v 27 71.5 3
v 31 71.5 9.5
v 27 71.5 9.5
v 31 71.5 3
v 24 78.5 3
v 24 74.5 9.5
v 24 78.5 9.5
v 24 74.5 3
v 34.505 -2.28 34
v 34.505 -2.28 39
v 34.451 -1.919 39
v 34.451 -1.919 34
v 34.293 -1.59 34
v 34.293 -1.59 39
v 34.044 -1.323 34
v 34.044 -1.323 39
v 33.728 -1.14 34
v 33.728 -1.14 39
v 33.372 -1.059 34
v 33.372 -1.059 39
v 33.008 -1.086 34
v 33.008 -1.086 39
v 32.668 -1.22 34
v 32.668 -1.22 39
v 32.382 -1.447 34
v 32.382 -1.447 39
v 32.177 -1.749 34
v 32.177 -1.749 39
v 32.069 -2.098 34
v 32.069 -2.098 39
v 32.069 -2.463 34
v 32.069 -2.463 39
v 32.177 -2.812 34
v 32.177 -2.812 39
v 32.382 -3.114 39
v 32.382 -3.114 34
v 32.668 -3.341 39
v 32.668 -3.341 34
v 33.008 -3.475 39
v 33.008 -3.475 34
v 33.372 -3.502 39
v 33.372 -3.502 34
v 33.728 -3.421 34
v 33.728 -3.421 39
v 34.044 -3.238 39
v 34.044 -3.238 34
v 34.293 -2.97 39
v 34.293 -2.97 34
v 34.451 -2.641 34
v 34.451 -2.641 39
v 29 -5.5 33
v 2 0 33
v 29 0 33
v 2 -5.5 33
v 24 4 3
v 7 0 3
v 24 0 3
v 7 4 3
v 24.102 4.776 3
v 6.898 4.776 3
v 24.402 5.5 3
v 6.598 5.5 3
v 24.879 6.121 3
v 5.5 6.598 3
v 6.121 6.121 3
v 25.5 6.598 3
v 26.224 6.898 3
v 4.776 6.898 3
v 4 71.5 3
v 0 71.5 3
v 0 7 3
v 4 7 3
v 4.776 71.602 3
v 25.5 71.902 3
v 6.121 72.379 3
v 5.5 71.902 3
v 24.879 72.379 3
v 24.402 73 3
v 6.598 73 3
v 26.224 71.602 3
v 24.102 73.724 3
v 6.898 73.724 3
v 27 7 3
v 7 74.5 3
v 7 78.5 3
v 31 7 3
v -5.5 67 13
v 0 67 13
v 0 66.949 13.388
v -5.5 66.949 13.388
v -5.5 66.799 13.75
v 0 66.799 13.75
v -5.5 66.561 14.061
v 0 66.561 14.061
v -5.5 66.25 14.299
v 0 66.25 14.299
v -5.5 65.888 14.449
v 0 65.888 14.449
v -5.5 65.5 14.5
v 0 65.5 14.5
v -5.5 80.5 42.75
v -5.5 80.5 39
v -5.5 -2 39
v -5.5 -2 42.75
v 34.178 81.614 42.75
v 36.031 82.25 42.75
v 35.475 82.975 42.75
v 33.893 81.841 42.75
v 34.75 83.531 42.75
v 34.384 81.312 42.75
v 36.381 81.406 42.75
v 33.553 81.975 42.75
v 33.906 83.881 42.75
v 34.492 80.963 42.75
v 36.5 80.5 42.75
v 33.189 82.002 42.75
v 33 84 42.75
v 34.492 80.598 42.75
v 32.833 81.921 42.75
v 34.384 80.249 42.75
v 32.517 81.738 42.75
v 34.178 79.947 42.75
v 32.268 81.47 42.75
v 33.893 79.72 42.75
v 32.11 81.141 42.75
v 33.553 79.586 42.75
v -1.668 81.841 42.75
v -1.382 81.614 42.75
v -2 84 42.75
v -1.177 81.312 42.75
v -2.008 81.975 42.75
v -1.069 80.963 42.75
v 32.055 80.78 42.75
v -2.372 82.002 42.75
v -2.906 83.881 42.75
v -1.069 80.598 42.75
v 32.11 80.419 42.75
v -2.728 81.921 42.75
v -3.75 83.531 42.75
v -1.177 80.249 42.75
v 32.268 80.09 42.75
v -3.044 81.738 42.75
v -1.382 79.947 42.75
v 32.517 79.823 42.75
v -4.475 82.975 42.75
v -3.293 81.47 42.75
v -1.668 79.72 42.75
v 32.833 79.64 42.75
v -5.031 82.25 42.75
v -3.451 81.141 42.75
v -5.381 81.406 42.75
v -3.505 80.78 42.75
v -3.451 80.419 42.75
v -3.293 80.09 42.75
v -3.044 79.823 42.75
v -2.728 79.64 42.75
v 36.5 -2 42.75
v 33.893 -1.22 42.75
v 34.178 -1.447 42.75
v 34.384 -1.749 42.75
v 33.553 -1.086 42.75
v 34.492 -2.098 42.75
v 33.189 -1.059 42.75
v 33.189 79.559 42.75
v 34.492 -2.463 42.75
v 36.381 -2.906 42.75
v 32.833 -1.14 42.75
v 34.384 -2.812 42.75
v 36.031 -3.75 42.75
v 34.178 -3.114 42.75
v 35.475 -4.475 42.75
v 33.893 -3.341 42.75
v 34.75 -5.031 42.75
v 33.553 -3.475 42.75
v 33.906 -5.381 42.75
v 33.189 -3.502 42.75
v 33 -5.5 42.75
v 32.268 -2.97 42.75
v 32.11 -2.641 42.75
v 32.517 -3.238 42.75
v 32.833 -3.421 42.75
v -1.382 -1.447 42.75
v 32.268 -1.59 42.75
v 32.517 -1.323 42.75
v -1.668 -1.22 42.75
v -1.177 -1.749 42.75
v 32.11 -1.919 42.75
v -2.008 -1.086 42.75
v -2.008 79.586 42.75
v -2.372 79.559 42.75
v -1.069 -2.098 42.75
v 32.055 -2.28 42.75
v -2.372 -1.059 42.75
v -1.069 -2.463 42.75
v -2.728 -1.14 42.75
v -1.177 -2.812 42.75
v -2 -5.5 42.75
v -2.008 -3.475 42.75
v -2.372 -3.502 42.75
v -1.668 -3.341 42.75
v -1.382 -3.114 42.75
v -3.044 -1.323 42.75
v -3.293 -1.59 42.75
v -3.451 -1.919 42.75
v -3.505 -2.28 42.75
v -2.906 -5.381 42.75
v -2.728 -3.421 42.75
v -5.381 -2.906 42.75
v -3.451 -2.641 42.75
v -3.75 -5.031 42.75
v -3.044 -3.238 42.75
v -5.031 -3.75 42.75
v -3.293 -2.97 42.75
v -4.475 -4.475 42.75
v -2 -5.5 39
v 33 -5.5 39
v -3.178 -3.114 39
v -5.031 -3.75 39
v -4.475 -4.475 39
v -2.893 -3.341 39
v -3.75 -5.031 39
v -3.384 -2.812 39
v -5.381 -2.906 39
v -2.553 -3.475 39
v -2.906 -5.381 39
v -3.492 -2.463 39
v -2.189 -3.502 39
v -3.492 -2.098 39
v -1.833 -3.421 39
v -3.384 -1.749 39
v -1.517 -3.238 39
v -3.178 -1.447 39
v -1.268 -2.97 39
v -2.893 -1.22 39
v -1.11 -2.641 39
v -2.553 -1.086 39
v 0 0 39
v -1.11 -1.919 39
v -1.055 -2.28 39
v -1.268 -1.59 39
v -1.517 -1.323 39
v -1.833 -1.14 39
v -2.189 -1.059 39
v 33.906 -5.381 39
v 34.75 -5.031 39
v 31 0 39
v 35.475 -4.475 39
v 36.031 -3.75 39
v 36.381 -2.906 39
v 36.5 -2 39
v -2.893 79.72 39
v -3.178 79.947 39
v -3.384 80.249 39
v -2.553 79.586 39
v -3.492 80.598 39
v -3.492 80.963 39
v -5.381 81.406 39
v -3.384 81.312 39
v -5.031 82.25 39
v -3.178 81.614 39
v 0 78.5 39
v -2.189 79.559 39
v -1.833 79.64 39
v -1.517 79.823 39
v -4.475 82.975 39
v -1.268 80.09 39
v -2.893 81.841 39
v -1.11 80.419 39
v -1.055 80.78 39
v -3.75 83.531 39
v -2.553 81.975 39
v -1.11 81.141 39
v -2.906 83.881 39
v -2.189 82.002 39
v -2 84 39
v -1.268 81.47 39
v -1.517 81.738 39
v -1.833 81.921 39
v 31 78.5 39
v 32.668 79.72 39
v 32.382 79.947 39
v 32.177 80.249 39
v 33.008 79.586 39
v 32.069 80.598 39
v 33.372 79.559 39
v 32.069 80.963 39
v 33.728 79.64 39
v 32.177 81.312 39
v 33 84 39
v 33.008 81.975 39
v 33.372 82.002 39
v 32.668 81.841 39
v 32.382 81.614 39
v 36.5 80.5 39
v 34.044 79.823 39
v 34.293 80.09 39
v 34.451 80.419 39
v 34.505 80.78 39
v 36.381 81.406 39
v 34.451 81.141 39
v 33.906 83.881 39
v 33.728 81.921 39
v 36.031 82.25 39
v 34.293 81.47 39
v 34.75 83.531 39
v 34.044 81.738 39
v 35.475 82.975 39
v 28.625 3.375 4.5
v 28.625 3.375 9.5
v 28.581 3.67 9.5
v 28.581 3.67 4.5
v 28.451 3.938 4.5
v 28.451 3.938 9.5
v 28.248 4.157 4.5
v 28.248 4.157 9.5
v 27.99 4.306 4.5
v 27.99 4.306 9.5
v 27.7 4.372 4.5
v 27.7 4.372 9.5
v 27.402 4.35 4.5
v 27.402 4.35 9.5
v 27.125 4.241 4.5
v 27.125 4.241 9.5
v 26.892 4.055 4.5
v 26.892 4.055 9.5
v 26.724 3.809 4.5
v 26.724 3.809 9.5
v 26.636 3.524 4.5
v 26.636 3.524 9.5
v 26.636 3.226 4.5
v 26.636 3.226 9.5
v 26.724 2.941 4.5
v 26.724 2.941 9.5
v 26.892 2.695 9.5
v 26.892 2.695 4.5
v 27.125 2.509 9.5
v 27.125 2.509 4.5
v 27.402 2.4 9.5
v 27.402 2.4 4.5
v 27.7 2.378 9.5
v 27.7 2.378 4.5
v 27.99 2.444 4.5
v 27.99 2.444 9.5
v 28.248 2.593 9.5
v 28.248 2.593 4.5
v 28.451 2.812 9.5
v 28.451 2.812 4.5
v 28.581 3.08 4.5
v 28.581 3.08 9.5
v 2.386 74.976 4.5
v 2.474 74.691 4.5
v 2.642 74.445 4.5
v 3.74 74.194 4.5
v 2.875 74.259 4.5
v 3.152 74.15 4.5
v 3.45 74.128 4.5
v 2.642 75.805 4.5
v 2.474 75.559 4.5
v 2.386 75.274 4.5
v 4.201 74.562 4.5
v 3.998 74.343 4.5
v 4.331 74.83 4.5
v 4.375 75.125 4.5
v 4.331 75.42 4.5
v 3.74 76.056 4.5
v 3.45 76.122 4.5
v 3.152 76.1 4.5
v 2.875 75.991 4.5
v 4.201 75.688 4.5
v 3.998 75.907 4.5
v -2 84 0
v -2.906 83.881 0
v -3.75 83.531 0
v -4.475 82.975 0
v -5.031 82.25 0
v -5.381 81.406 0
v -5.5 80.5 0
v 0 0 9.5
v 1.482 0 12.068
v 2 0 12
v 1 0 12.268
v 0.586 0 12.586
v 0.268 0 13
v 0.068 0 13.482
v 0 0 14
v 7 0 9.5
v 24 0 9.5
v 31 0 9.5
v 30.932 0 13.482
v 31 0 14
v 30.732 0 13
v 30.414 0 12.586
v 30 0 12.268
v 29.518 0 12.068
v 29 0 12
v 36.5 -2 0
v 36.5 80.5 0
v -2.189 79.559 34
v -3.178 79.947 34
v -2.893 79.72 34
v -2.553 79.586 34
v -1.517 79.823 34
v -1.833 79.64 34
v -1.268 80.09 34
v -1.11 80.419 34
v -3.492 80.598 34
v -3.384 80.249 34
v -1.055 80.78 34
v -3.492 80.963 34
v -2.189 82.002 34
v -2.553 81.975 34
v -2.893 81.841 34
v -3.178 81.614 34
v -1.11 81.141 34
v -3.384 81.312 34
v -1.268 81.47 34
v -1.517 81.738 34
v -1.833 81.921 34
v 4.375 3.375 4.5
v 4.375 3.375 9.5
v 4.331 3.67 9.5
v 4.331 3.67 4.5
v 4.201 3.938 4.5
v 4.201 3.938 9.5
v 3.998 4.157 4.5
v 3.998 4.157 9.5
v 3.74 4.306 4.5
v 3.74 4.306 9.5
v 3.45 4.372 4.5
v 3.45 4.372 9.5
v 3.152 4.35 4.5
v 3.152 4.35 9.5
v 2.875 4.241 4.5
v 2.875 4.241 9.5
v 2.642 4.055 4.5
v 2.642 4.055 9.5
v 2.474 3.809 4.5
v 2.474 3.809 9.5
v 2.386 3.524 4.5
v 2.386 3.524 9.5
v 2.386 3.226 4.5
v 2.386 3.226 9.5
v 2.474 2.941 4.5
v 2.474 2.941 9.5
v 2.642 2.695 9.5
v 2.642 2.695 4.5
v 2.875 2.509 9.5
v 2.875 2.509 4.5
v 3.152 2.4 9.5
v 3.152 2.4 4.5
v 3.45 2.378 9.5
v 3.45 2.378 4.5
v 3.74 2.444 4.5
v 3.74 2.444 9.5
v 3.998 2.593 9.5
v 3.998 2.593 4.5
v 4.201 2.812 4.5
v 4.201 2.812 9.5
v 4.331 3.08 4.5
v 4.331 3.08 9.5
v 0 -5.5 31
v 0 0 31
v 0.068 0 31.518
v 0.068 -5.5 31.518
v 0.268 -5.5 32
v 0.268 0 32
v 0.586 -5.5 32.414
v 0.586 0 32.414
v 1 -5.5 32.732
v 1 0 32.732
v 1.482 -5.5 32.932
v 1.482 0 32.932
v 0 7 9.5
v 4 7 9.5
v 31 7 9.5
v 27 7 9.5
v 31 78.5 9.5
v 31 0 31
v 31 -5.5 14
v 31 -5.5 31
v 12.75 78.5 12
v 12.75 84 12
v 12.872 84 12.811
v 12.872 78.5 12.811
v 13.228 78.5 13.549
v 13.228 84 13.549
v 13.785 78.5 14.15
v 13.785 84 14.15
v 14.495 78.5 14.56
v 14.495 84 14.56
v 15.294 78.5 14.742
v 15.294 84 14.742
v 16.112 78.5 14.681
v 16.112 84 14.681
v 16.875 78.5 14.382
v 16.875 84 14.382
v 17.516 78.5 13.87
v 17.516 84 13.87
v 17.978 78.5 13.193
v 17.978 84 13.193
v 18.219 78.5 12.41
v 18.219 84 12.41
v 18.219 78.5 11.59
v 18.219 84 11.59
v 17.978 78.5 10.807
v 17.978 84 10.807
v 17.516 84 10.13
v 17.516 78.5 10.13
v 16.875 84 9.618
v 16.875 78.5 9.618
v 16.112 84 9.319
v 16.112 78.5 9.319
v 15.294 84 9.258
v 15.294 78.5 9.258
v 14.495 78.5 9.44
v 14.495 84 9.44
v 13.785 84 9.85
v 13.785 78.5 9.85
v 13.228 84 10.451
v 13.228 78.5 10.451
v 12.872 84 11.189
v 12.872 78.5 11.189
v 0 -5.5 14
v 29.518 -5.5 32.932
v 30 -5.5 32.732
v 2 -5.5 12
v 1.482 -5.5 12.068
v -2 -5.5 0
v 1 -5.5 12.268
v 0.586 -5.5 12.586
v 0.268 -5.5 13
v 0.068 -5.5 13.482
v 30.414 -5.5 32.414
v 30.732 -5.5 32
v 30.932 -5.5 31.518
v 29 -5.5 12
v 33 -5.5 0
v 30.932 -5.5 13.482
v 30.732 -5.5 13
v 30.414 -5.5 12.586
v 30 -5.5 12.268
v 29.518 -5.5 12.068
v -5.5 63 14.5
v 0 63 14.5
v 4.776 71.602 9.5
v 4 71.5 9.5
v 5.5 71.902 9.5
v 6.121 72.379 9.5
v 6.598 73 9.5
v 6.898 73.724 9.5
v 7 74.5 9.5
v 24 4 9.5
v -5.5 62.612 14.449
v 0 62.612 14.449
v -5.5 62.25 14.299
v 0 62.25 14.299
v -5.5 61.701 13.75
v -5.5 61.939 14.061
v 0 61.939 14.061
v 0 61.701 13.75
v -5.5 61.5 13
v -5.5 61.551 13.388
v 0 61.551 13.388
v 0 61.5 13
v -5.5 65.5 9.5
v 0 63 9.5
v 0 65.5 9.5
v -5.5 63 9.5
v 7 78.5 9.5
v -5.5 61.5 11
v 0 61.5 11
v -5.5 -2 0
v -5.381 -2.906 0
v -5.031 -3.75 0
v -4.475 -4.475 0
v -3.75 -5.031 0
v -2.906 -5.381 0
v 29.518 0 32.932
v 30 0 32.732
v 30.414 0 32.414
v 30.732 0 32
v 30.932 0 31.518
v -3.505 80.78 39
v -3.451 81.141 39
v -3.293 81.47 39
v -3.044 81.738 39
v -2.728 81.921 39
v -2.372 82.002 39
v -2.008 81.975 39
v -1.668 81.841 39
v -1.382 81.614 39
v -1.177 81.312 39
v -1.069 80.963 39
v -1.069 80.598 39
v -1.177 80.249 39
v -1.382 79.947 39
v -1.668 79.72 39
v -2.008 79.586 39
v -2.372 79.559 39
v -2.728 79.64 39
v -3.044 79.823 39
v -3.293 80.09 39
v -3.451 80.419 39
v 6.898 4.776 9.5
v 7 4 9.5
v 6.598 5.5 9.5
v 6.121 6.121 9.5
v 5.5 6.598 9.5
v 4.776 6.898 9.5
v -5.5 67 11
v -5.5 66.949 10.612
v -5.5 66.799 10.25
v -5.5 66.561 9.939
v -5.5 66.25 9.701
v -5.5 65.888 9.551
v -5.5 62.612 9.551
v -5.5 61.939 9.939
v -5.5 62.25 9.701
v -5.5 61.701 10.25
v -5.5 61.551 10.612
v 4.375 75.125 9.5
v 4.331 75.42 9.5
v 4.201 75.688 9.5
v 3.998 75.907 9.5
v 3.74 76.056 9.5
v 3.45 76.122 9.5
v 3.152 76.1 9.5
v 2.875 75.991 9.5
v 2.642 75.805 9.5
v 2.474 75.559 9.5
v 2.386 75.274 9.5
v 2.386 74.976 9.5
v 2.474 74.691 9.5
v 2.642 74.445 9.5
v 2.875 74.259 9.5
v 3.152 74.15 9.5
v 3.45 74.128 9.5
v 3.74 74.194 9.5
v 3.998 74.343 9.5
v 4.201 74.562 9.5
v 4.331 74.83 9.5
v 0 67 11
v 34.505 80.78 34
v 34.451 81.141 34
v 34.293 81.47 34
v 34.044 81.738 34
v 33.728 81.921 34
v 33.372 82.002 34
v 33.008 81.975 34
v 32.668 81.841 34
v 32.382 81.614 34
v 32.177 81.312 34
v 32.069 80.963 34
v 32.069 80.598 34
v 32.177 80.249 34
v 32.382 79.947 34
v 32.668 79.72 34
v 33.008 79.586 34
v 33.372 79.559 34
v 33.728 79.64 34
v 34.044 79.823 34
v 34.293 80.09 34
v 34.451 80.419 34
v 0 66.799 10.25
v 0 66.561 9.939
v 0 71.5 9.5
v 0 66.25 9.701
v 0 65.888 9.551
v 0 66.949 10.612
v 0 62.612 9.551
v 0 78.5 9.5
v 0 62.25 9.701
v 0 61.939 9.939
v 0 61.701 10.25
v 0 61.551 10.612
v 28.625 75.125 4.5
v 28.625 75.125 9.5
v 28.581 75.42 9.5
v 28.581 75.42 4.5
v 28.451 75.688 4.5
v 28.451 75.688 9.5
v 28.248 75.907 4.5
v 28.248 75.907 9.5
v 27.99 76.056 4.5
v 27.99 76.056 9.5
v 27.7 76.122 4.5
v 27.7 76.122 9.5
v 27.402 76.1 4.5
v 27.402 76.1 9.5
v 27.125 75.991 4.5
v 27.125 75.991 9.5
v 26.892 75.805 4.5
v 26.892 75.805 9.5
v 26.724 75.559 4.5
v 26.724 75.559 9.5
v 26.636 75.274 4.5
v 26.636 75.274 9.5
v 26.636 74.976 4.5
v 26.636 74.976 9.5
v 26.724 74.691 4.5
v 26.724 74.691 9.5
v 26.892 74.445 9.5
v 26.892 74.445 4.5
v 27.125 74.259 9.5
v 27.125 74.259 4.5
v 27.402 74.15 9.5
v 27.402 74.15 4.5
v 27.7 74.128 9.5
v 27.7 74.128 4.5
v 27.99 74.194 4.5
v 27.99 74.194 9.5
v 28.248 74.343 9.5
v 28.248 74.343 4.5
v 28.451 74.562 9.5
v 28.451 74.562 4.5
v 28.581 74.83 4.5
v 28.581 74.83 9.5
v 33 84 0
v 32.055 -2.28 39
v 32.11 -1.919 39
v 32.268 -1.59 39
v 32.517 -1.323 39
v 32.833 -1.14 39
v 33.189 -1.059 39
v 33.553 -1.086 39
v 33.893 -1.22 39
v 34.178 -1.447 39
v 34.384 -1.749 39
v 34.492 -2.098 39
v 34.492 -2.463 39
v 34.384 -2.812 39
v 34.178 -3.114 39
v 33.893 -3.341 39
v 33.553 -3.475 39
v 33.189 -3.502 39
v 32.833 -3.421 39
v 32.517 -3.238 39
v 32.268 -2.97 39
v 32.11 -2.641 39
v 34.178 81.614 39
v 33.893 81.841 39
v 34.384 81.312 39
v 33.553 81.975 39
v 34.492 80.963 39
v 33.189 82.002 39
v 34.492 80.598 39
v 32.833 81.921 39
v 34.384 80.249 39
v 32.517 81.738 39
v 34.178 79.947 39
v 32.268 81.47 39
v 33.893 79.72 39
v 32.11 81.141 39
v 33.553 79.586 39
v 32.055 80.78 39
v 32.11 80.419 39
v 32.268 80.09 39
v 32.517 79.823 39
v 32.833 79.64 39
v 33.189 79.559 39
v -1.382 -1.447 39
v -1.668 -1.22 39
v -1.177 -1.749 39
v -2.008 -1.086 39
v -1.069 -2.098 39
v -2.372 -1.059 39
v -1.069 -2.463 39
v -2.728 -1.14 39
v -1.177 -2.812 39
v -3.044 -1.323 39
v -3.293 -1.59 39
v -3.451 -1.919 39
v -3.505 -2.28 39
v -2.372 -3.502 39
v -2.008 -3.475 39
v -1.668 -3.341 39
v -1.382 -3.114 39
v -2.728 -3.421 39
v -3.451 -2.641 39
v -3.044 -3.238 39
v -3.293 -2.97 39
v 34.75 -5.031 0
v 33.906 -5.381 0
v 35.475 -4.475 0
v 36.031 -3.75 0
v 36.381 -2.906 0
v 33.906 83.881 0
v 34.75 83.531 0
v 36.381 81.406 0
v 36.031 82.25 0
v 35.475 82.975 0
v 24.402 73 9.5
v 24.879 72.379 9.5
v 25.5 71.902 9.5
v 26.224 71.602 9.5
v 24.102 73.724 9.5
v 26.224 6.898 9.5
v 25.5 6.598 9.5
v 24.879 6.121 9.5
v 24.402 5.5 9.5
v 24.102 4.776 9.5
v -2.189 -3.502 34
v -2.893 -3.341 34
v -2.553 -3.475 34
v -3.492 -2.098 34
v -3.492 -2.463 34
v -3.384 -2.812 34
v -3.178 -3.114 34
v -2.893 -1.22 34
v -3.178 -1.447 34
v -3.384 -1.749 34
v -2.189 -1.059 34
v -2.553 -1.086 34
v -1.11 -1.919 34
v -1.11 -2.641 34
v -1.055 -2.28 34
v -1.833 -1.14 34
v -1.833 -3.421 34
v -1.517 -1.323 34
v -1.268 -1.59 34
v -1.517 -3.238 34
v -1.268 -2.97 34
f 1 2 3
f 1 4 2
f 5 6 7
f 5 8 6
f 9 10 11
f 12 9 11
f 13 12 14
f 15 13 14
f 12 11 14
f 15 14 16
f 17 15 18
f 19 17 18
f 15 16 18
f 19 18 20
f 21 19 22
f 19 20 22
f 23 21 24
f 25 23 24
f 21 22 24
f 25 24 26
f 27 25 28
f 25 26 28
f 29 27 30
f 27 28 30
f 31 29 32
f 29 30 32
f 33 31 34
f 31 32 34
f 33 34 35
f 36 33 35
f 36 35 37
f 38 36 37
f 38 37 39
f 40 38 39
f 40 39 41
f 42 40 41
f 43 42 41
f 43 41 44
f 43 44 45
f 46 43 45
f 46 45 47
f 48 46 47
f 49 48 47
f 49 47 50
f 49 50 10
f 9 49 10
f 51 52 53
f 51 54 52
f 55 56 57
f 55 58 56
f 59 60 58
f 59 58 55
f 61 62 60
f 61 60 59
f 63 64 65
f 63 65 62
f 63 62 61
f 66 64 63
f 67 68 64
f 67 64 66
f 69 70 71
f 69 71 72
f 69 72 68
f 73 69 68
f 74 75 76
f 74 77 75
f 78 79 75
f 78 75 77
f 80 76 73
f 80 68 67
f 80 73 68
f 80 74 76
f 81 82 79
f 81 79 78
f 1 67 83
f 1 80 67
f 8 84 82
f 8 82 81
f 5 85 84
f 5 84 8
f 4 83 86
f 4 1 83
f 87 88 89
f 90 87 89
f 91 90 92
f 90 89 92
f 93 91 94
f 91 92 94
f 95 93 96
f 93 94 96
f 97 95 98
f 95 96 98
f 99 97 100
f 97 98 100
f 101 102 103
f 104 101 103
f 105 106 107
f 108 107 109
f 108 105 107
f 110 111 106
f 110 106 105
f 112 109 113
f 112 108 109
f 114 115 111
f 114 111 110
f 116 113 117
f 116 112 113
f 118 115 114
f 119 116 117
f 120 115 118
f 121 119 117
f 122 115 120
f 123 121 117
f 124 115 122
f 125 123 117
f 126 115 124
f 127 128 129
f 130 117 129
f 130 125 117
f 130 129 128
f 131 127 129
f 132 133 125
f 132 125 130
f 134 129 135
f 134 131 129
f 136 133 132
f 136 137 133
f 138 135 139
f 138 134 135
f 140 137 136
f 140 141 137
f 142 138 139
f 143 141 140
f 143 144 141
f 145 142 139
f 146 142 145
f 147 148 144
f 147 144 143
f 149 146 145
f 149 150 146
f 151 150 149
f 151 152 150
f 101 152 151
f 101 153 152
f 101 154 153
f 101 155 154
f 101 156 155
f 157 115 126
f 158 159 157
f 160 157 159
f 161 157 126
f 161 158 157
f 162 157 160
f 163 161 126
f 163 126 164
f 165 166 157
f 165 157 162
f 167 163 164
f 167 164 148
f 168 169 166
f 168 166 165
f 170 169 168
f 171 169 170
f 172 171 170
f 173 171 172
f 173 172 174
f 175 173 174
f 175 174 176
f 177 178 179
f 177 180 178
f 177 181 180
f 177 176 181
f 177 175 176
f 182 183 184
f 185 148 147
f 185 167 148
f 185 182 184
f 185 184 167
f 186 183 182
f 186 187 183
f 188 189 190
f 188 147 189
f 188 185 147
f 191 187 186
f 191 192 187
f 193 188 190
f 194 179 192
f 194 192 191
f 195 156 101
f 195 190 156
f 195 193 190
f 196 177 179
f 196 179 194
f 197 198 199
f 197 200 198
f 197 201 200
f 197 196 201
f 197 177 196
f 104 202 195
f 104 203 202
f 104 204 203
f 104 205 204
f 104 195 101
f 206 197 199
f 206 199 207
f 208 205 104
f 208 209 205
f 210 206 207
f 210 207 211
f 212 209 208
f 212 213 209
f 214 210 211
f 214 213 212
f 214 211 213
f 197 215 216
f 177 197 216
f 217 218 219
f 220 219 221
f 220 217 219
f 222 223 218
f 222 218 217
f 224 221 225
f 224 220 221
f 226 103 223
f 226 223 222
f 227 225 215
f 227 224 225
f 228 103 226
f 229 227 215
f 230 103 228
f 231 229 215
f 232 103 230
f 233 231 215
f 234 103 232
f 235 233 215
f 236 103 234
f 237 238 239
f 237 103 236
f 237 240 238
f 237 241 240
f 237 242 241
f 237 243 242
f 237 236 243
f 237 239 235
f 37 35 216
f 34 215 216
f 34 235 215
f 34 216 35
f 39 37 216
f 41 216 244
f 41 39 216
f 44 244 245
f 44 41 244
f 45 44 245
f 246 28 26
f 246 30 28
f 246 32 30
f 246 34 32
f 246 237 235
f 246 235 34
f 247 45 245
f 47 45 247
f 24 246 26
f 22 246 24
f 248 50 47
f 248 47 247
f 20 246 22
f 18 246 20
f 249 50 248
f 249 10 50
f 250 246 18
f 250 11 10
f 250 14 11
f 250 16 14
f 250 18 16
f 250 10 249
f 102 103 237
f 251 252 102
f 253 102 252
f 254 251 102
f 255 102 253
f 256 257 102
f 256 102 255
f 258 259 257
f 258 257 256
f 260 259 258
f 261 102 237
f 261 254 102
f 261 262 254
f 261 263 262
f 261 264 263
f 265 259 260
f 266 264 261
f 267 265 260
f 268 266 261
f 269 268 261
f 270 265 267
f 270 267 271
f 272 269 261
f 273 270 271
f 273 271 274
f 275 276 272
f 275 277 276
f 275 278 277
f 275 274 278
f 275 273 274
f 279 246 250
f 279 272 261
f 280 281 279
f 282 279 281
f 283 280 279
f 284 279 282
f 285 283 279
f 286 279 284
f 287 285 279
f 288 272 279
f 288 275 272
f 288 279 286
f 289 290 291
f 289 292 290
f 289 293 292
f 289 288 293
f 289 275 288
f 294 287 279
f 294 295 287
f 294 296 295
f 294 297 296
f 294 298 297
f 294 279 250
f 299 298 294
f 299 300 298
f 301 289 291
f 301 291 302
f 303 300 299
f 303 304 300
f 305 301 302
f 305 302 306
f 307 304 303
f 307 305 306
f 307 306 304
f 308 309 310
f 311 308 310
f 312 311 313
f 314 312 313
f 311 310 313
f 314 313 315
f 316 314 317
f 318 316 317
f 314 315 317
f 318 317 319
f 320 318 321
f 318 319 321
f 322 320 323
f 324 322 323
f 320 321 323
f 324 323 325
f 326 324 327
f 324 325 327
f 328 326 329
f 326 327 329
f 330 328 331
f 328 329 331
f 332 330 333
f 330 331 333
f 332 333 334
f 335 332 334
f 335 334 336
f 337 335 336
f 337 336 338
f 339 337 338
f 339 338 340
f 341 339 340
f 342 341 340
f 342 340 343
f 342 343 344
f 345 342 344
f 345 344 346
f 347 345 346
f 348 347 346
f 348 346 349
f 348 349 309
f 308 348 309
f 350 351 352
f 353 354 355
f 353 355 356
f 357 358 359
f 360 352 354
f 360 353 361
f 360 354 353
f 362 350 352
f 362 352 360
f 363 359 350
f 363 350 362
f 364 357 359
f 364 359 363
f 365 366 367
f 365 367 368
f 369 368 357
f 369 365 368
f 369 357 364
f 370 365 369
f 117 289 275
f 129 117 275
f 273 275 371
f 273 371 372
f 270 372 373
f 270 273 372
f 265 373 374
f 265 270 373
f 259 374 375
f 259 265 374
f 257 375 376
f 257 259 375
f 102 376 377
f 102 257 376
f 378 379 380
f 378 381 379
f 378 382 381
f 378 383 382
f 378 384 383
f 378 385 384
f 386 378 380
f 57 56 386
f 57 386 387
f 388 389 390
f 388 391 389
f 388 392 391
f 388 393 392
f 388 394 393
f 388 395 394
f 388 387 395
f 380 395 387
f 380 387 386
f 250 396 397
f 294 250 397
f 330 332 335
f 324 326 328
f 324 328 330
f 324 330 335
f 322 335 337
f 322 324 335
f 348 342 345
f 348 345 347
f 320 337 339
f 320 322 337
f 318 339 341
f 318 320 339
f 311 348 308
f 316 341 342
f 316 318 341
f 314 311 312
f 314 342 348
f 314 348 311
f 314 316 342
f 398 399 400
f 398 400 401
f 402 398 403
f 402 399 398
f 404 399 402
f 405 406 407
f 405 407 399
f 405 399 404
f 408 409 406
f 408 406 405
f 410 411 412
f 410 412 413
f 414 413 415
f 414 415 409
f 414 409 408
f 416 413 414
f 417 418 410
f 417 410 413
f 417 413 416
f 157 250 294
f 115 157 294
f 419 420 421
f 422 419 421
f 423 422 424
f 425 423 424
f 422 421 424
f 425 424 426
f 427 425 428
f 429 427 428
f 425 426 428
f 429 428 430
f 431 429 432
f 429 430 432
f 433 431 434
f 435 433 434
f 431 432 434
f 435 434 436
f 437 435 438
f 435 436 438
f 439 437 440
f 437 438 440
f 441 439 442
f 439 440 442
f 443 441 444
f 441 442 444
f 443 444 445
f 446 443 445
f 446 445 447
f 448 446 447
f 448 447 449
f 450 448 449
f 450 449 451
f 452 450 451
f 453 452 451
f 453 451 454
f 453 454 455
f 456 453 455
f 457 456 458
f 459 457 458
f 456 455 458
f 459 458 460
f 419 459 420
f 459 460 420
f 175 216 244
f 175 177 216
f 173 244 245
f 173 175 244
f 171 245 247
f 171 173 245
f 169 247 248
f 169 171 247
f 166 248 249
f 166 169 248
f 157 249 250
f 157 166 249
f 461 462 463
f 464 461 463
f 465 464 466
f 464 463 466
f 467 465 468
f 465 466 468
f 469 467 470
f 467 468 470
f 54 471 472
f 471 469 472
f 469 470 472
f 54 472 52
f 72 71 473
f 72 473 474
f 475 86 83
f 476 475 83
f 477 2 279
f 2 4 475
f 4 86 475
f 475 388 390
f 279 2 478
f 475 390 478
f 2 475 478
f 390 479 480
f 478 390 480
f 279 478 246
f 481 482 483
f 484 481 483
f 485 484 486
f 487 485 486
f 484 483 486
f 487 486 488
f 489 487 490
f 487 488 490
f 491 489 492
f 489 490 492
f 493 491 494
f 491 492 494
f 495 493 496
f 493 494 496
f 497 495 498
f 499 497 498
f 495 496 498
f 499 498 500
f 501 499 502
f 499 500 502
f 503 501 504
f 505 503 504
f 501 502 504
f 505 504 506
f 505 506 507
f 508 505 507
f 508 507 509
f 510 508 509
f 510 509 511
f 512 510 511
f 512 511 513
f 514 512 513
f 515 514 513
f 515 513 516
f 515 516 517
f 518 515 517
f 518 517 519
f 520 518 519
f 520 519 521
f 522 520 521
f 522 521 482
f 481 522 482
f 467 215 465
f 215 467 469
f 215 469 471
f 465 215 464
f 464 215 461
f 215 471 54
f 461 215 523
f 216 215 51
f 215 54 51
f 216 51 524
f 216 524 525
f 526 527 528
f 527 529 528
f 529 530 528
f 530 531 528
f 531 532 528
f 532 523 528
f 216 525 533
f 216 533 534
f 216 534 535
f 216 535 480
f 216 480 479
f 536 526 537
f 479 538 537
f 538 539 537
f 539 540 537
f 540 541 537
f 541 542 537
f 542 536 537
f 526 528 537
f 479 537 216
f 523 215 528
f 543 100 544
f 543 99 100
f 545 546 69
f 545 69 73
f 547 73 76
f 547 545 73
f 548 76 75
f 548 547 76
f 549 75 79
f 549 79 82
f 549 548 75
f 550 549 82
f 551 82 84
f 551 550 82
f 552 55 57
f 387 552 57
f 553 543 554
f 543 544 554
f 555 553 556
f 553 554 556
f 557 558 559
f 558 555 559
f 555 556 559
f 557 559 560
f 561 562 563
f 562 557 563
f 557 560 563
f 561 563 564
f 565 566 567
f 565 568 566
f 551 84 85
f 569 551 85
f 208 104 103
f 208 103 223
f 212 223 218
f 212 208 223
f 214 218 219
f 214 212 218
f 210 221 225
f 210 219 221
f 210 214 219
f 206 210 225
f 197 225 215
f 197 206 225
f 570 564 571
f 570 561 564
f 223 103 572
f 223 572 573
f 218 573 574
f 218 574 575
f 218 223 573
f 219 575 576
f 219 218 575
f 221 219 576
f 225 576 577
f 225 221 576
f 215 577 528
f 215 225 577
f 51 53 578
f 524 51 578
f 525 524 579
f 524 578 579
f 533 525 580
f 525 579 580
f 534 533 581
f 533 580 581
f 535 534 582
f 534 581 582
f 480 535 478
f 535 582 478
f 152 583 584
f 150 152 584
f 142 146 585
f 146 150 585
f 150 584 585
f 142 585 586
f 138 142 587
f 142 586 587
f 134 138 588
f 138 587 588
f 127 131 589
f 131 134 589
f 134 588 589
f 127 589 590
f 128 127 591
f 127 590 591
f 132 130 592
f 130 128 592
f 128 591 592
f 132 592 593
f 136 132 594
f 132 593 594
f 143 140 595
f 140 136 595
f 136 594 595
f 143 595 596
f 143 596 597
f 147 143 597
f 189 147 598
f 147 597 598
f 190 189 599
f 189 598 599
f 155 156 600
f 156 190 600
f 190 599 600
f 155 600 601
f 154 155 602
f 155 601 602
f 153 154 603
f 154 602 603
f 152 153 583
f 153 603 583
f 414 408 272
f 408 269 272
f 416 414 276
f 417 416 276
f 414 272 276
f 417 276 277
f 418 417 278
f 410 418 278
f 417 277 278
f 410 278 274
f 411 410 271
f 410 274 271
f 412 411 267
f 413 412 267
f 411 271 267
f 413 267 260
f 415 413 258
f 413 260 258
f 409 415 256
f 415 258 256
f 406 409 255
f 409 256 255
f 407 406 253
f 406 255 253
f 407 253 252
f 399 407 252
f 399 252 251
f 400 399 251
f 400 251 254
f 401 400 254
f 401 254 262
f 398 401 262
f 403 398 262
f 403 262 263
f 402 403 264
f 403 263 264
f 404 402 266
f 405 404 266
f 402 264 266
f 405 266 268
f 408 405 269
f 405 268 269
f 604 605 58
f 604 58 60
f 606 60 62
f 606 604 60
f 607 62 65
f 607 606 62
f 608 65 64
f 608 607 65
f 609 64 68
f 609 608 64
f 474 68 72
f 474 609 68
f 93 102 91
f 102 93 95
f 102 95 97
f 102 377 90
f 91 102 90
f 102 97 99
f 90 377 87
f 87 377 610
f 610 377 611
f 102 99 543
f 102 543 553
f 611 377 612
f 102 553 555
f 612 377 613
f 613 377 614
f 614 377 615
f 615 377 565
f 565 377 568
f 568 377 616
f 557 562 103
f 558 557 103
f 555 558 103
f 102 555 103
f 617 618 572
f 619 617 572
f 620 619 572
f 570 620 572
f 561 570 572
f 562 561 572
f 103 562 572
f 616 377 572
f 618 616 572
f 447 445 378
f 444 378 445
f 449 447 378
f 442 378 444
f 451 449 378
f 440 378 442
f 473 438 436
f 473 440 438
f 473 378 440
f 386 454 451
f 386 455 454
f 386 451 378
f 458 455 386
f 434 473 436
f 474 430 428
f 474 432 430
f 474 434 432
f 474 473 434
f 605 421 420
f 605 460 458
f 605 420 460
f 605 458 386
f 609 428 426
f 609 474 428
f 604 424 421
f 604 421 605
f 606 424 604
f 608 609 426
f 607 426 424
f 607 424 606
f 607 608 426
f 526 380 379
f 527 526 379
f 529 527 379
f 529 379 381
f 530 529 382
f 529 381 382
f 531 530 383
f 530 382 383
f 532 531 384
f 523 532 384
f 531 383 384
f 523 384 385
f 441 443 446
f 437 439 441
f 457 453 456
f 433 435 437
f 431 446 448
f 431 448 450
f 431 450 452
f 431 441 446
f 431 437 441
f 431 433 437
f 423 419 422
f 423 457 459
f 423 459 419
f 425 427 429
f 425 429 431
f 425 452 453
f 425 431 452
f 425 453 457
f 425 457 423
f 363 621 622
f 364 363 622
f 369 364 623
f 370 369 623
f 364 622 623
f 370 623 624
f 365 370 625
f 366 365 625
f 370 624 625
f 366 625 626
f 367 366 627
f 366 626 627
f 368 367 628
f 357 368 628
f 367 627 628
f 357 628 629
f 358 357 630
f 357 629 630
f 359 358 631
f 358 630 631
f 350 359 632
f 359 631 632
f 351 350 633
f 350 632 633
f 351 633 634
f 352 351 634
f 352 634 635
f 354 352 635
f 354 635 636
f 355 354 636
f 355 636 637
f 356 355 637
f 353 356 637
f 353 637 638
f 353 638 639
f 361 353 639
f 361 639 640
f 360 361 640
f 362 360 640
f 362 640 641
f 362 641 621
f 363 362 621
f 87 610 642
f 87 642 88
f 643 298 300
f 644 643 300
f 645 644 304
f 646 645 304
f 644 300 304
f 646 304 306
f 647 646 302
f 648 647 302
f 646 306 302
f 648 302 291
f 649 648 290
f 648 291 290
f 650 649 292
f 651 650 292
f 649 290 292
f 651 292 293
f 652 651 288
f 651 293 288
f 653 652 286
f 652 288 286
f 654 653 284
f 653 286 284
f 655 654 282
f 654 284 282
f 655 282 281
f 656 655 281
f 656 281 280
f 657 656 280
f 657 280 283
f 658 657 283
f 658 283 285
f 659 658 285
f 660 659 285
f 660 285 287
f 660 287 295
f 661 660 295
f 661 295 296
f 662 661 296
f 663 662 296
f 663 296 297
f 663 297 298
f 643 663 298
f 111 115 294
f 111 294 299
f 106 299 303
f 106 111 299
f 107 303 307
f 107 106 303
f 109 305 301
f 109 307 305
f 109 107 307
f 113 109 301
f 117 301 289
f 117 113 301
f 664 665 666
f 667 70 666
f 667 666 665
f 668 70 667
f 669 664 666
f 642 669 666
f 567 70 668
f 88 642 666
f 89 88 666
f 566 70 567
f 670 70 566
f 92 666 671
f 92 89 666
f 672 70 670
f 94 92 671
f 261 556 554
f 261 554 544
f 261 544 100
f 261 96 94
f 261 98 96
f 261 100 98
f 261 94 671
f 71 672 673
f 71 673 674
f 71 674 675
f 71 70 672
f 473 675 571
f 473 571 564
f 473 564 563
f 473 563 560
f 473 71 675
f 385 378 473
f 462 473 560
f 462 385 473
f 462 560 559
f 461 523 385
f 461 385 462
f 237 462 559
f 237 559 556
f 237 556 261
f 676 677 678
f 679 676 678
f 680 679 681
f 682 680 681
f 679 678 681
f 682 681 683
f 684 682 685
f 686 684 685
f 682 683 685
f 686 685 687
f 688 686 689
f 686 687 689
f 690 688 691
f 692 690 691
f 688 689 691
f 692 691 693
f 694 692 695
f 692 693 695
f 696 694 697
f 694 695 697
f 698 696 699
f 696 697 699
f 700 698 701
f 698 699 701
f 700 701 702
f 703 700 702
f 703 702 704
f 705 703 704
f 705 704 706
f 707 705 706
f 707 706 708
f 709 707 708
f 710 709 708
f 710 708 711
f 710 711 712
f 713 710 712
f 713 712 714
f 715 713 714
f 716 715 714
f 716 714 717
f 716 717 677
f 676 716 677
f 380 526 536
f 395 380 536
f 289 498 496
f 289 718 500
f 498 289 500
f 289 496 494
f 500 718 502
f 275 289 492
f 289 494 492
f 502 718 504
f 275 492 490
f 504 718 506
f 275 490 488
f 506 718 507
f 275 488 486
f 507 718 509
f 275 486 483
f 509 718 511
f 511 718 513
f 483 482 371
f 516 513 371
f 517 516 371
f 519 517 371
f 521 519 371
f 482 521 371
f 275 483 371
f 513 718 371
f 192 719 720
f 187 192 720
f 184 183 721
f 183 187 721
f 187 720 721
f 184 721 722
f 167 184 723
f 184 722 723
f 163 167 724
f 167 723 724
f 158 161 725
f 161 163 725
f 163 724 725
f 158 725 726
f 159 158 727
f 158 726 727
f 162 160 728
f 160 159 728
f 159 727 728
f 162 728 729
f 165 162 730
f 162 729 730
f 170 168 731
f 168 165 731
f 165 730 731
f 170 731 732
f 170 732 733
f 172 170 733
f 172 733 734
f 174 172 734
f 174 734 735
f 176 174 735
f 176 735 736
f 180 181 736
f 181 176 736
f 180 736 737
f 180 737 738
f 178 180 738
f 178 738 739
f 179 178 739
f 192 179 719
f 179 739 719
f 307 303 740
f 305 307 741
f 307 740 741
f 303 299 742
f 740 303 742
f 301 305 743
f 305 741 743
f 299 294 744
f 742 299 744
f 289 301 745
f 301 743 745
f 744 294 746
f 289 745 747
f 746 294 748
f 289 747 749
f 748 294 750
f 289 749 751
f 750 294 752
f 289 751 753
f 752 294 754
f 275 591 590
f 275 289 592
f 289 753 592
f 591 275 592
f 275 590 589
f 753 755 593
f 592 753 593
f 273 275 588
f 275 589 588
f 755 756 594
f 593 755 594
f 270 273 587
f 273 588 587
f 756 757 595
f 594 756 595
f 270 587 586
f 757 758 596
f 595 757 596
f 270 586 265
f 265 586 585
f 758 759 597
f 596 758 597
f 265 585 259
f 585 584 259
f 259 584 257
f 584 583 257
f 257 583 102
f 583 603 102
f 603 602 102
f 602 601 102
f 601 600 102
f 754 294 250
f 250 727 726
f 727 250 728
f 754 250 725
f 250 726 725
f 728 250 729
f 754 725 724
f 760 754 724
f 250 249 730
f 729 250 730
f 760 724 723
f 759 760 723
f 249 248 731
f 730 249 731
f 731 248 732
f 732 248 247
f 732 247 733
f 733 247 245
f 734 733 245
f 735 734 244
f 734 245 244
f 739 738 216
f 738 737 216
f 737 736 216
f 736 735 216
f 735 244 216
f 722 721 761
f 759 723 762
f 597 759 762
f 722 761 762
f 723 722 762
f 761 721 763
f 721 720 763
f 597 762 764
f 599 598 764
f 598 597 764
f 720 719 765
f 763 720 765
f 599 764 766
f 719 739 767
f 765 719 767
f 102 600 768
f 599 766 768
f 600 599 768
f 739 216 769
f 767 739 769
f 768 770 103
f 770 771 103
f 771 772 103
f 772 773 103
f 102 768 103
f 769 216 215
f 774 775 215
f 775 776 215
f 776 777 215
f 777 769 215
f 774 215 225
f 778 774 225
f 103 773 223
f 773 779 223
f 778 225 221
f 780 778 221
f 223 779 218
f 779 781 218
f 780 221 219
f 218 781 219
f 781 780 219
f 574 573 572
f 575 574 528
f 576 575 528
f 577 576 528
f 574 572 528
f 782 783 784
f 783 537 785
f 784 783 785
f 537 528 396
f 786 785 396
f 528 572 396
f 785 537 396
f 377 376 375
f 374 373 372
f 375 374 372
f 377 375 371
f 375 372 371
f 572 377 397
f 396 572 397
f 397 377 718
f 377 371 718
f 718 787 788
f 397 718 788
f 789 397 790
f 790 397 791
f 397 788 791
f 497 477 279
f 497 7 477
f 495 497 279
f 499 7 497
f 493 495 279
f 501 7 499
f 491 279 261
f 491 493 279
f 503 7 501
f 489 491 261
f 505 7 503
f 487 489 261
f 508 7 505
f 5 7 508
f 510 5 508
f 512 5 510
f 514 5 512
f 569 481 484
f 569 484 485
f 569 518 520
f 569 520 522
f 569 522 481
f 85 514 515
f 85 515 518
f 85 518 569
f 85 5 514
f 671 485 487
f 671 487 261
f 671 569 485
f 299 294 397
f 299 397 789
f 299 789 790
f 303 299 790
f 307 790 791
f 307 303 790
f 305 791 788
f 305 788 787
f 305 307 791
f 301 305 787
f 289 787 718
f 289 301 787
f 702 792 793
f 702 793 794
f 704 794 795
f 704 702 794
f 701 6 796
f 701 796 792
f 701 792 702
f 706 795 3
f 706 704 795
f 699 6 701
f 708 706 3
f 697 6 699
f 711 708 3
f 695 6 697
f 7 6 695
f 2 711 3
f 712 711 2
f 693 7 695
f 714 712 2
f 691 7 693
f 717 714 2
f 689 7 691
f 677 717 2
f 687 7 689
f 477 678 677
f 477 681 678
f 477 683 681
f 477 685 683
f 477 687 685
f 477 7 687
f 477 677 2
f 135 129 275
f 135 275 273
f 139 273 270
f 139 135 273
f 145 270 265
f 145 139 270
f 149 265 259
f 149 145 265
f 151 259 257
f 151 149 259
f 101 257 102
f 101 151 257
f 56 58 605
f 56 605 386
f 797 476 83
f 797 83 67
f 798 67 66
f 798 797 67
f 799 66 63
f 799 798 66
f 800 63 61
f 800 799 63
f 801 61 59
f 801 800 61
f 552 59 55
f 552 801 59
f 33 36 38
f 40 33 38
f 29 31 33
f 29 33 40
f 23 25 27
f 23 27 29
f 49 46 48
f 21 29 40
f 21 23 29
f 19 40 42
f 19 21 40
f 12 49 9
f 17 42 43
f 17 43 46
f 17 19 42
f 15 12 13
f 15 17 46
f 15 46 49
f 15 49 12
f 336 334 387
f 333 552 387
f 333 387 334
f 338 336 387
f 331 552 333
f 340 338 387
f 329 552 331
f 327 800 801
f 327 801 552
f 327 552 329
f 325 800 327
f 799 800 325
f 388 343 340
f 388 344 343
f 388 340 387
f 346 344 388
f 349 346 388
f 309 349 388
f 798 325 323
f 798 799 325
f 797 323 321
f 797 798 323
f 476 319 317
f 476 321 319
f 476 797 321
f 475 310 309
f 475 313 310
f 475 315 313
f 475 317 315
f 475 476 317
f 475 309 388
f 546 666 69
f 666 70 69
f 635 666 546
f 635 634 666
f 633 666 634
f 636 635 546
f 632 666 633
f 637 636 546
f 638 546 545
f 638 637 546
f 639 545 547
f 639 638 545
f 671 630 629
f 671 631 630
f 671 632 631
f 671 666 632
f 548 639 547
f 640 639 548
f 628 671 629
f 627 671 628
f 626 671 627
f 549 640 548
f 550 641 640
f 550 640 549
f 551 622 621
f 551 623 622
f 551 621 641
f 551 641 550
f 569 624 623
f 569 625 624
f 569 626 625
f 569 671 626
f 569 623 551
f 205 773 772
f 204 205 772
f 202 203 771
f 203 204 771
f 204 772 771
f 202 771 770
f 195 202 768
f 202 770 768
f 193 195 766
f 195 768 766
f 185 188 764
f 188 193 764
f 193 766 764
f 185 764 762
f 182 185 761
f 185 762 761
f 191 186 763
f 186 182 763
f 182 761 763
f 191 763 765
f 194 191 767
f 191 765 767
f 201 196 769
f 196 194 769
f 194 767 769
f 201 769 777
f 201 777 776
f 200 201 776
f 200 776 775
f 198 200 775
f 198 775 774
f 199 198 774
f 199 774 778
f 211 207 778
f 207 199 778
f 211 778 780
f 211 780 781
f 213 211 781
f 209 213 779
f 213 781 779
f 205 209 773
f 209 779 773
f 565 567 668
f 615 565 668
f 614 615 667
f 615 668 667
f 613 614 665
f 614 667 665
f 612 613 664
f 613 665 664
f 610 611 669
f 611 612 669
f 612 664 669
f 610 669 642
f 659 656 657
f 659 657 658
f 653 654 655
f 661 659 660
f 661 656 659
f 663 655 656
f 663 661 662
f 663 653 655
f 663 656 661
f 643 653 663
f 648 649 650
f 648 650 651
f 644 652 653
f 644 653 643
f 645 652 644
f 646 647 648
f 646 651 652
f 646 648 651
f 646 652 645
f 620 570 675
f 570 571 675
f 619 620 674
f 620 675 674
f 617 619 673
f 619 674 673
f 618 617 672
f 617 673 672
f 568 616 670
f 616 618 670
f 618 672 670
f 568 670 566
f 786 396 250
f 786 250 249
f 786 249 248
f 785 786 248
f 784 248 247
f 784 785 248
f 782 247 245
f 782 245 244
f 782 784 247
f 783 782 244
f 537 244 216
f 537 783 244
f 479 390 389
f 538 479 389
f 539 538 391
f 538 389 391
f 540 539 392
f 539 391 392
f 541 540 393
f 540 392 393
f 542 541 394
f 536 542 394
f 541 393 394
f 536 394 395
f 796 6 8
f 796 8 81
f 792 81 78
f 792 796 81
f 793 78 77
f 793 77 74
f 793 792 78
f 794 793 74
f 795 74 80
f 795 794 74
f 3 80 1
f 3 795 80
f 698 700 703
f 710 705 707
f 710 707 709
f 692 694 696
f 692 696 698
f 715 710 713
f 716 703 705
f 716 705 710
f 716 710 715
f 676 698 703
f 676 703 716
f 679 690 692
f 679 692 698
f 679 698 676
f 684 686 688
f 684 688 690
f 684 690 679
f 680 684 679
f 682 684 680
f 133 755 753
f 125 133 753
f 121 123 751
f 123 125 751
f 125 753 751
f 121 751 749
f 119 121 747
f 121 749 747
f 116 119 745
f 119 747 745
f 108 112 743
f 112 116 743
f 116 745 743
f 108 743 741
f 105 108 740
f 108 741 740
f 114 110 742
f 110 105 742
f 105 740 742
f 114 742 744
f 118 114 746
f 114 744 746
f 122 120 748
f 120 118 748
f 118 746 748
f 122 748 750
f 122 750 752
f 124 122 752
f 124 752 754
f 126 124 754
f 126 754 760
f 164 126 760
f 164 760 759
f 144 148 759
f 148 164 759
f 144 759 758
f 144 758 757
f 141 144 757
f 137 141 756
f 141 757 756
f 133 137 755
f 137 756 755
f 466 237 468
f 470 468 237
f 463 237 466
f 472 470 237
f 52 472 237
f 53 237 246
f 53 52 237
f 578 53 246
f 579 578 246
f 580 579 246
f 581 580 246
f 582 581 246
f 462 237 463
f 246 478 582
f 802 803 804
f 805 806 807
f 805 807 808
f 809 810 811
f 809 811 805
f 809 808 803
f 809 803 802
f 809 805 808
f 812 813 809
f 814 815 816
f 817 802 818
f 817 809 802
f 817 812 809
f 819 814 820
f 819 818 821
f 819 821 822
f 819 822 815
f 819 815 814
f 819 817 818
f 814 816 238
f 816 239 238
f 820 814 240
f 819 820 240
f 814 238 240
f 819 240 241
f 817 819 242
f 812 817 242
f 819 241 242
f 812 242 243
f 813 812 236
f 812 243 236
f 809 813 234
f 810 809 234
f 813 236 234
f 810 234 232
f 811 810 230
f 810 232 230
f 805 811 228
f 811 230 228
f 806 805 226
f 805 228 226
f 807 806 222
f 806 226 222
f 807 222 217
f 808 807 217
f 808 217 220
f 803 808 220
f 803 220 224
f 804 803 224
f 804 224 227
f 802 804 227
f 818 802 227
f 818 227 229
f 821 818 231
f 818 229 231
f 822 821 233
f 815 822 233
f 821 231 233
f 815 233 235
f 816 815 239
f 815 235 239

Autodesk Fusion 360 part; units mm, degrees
sketch "top" plane through (0, 0, 0) normal (0, 0, 1) x (1, 0, 0)
  line L0 (0, 0) -> (31, 0)
  line L1 (31, 0) -> (31, 78.5)
  line L2 (31, 78.5) -> (0, 78.5)
  line L3 (0, 78.5) -> (0, 0)
  line L4 (36.5, -5.5) -> (36.5, 84)
  line L5 (36.5, 84) -> (-5.5, 84)
  line L6 (-5.5, 84) -> (-5.5, -5.5)
  line L7 (-5.5, -5.5) -> (36.5, -5.5)
  line L8 (-5.5, 39.25) -> (36.5, 39.25) construction
  line L9 (15.5, -5.5) -> (15.5, 84) construction
  line L10 (-5.5, -5.5) -> (0, 0) construction
  circle A0 centre (-2.2804, -2.2804) radius 1.225
  line L11 (-5.5, 67) -> (36.5, 67)
  line L12 (-5.5, 61.5) -> (0, 61.5)
  circle A1 centre (3.375, 3.375) radius 2.125
  circle A2 centre (3.375, 75.125) radius 2.125
  circle A3 centre (27.625, 3.375) radius 2.125
  circle A4 centre (27.625, 75.125) radius 2.125
  circle A5 centre (-2.2804, 80.7804) radius 1.225
  circle A6 centre (33.2804, -2.2804) radius 1.225
  circle A7 centre (33.2804, 80.7804) radius 1.225
  circle A8 centre (3.375, 3.375) radius 1
  circle A9 centre (27.625, 3.375) radius 1
  circle A10 centre (27.625, 75.125) radius 1
  circle A11 centre (3.375, 75.125) radius 1
  line L13 (0, 7) -> (7, 7)
  line L14 (7, 7) -> (7, 0)
  line L15 (24, 7) -> (24, 0)
  line L16 (31, 7) -> (24, 7)
  line L17 (24, 71.5) -> (24, 78.5)
  line L18 (31, 71.5) -> (24, 71.5)
  line L19 (7, 71.5) -> (7, 78.5)
  line L20 (0, 71.5) -> (7, 71.5)
  point P0 (-2.2804, -2.2804)
  dimension "d1" = 31
  dimension "d2" = 78.5
  dimension "d3" = 5.5
  dimension "d4" = 2.45
  dimension "d5" = 17
  dimension "d6" = 5.5
  dimension "d7" = 4.25
  dimension "d8" = 1.25
  dimension "d9" = 1.25
  dimension "d10" = 2
  dimension "d41" = 2
  dimension "d45" = 7
  dimension "d46" = 7
extrude "Extrude1" add sketch "top" along normal blind 3 contours L0 L3 L13 L14 | L0 L1 L3 L4 L6 L7 L11 L12 | L0 L1 L3 L11 L13 L14 L15 L16 | L0 L1 L15 L16 | L3 L6 L11 L12 | L1 L2 L3 L4 L5 L6 L11 | L1 L2 L3 L11 L17 L18 L19 L20 | L2 L3 L19 L20 | L1 L2 L17 L18 | A0 | A1 | A2 | A3 | A4 | A5 | A6 | A7 | A8 | A9 | A10 | A11 makes body 1
extrude "Extrude2" add sketch "top" along normal blind 36 from surface at 3 contours L0 L1 L3 L4 L6 L7 L11 L12 | L3 L6 L11 L12 | L1 L2 L3 L4 L5 L6 L11 | A0 | A5 | A6 | A7 bodies 1
extrude "Extrude3" add sketch "top" along normal blind 6.5 from surface at 3 contours A1 | A2 | A3 | A4 | A8 | A9 | A10 | A11 bodies 1
sketch "side" plane through (-5.5, 0, 0) normal (-1, 0, 0) x (0, -1, 0)
  line L0 (-84, 0) -> (5.5, 0)
  line L1 (5.5, 0) -> (5.5, 39)
  line L2 (5.5, 39) -> (-84, 39)
  line L3 (-84, 39) -> (-84, 0)
  line L4 (-84, 0) -> (5.5, 0)
  line L5 (-84, 0) -> (-84, 39)
  line L6 (-84, 39) -> (5.5, 39)
  line L7 (5.5, 0) -> (5.5, 39)
  line L8 (-84, 19.5) -> (5.5, 19.5) construction
  line L9 (-1.25, 9.5) -> (-5.5, 9.5)
  line L10 (-73, 9.5) -> (-77.25, 9.5)
  line L11 (-5.5, 3) -> (-1.25, 3)
  line L12 (-77.25, 3) -> (-73, 3)
  line L13 (0, 3) -> (-78.5, 3)
  line L14 (0, 3) -> (0, 39)
  line L15 (-78.5, 3) -> (-78.5, 39)
  line L16 (-73, 9.5) -> (-5.5, 9.5) construction
  line L17 (-39.25, 39) -> (-39.25, 0) construction
  line L18 (-67, 0) -> (-67, 19.5) construction
  line L19 (-61.5, 0) -> (-61.5, 19.5) construction
  line L20 (-84, 14.5) -> (-61.5, 14.5) construction
  line L21 (-67, 14.5) -> (-61.5, 14.5)
  line L22 (-61.5, 14.5) -> (-61.5, 9.5)
  line L23 (-61.5, 9.5) -> (-67, 9.5)
  line L24 (-67, 9.5) -> (-67, 14.5)
  point P0 (-61.5, 0)
  point P1 (-67, 0)
  dimension "d19" = 5
extrude "Extrude4" cut sketch "side" against normal up to surface (5.5 mm away) contours L21 L22 L23 L24 bodies 1
sketch "back" plane through (0, -5.5, 0) normal (0, -1, 0) x (1, 0, 0)
  line L0 (-5.5, 0) -> (36.5, 0)
  line L1 (36.5, 0) -> (36.5, 39)
  line L2 (36.5, 39) -> (-5.5, 39)
  line L3 (-5.5, 39) -> (-5.5, 0)
  line L4 (0, 3) -> (0, 39)
  line L5 (5.5, 9.5) -> (1.25, 9.5)
  line L6 (1.25, 3) -> (5.5, 3)
  line L7 (25.5, 3) -> (29.75, 3)
  line L8 (29.75, 9.5) -> (25.5, 9.5)
  line L9 (31, 3) -> (31, 39)
  line L10 (31, 3) -> (0, 3)
  line L11 (0, 39) -> (31, 39)
  line L12 (-5.5, 0) -> (36.5, 0)
  line L13 (36.5, 0) -> (36.5, 39)
  line L14 (-5.5, 0) -> (-5.5, 39)
  line L15 (0, 33) -> (31, 33)
  line L16 (0, 12) -> (31, 12)
  dimension "d22" = 6
  dimension "d23" = 2.5
extrude "Extrude5" cut sketch "back" against normal up to surface (5.5 mm away) contours L4 L9 L15 L16 bodies 1
sketch "front" plane through (0, 84, 0) normal (0, 1, 0) x (-1, 0, 0)
  line L0 (-36.5, 0) -> (5.5, 0)
  line L1 (5.5, 0) -> (5.5, 39)
  line L2 (5.5, 39) -> (-36.5, 39)
  line L3 (-36.5, 39) -> (-36.5, 0)
  line L4 (-36.5, 0) -> (-36.5, 39)
  line L5 (-36.5, 39) -> (5.5, 39)
  line L6 (5.5, 0) -> (5.5, 39)
  line L7 (-36.5, 0) -> (5.5, 0)
  line L8 (-25.5, 9.5) -> (-29.75, 9.5)
  line L9 (-1.25, 9.5) -> (-5.5, 9.5)
  line L10 (-31, 3) -> (0, 3)
  line L11 (0, 3) -> (0, 39)
  line L12 (-31, 3) -> (-31, 39)
  line L13 (-31, 12) -> (0, 12) construction
  line L14 (-15.5, 39) -> (-15.5, 12) construction
  circle A0 centre (-15.5, 12) radius 2.75
  dimension "d26" = 2.5
  dimension "d27" = 5.5
extrude "Extrude6" cut sketch "front" against normal up to surface (5.5 mm away) contours A0 bodies 1
extrude "Extrude7" cut sketch "top" against normal blind 5 from surface at 39 contours A0 | A5 | A6 | A7 bodies 1
sketch "lid" plane through (0, 0, 39) normal (0, 0, 1) x (-1, 0, 0)
  circle A0 centre (-33.2804, -80.7804) radius 1.225
  circle A1 centre (-33.2804, 2.2804) radius 1.225
  circle A2 centre (2.2804, -80.7804) radius 1.225
  circle A3 centre (2.2804, 2.2804) radius 1.225
  line L0 (-31, 0) -> (0, 0)
  line L1 (0, 0) -> (0, -78.5)
  line L2 (0, -78.5) -> (-31, -78.5)
  line L3 (-31, -78.5) -> (-31, 0)
  line L4 (5.5, -84) -> (5.5, 5.5)
  line L5 (5.5, 5.5) -> (-36.5, 5.5)
  line L6 (-36.5, 5.5) -> (-36.5, -84)
  line L7 (-36.5, -84) -> (5.5, -84)
  line L8 (5.5, -84) -> (5.5, 5.5)
  line L9 (-36.5, -84) -> (5.5, -84)
  line L10 (-36.5, 5.5) -> (-36.5, -84)
  line L11 (5.5, 5.5) -> (-36.5, 5.5)
  circle A4 centre (2.2804, 2.2804) radius 1.225
  circle A5 centre (-33.2804, 2.2804) radius 1.225
  circle A6 centre (-33.2804, -80.7804) radius 1.225
  circle A7 centre (2.2804, -80.7804) radius 1.225
  line L12 (0, 0) -> (0, -78.5)
  line L13 (0, -78.5) -> (-31, -78.5)
  line L14 (-31, -78.5) -> (-31, 0)
  line L15 (-31, 0) -> (0, 0)
extrude "Extrude8" add sketch "lid" along normal blind 3.75 separate body contours L0 L1 L2 L3 L12 L13 L14 L15 | L4 L5 L6 L7 L8 L9 L10 L11 makes body 2
fillet "Fillet1" radius 3.5 8 edges at (36.5, 84, 19.5) (-5.5, 84, 19.5) (-5.5, -5.5, 19.5) (36.5, -5.5, 19.5) (36.5, 84, 40.875) (-5.5, 84, 40.875) (-5.5, -5.5, 40.875) (36.5, -5.5, 40.875) on bodies 1 2
fillet "Fillet2" radius 2 4 edges at (31, -2.75, 33) (0, -2.75, 33) (0, -2.75, 12) (31, -2.75, 12) on bodies 1
fillet "Fillet3" radius 1.5 4 edges at (-2.75, 67, 14.5) (-2.75, 61.5, 14.5) (-2.75, 61.5, 9.5) (-2.75, 67, 9.5) on bodies 1
extrude "Extrude9" cut sketch "top" against normal blind 5 from surface at 9.5 contours A8 | A9 | A10 | A11 bodies 1
extrude "Extrude10" add sketch "top" along normal up to surface (6.5 mm away) from surface at 3 contours L0 L3 L13 L14 | L0 L1 L15 L16 | L2 L3 L19 L20 | L1 L2 L17 L18 bodies 1
fillet "Fillet4" radius 3 4 edges at (24, 71.5, 6.25) (24, 7, 6.25) (7, 7, 6.25) (7, 71.5, 6.25) on bodies 1
